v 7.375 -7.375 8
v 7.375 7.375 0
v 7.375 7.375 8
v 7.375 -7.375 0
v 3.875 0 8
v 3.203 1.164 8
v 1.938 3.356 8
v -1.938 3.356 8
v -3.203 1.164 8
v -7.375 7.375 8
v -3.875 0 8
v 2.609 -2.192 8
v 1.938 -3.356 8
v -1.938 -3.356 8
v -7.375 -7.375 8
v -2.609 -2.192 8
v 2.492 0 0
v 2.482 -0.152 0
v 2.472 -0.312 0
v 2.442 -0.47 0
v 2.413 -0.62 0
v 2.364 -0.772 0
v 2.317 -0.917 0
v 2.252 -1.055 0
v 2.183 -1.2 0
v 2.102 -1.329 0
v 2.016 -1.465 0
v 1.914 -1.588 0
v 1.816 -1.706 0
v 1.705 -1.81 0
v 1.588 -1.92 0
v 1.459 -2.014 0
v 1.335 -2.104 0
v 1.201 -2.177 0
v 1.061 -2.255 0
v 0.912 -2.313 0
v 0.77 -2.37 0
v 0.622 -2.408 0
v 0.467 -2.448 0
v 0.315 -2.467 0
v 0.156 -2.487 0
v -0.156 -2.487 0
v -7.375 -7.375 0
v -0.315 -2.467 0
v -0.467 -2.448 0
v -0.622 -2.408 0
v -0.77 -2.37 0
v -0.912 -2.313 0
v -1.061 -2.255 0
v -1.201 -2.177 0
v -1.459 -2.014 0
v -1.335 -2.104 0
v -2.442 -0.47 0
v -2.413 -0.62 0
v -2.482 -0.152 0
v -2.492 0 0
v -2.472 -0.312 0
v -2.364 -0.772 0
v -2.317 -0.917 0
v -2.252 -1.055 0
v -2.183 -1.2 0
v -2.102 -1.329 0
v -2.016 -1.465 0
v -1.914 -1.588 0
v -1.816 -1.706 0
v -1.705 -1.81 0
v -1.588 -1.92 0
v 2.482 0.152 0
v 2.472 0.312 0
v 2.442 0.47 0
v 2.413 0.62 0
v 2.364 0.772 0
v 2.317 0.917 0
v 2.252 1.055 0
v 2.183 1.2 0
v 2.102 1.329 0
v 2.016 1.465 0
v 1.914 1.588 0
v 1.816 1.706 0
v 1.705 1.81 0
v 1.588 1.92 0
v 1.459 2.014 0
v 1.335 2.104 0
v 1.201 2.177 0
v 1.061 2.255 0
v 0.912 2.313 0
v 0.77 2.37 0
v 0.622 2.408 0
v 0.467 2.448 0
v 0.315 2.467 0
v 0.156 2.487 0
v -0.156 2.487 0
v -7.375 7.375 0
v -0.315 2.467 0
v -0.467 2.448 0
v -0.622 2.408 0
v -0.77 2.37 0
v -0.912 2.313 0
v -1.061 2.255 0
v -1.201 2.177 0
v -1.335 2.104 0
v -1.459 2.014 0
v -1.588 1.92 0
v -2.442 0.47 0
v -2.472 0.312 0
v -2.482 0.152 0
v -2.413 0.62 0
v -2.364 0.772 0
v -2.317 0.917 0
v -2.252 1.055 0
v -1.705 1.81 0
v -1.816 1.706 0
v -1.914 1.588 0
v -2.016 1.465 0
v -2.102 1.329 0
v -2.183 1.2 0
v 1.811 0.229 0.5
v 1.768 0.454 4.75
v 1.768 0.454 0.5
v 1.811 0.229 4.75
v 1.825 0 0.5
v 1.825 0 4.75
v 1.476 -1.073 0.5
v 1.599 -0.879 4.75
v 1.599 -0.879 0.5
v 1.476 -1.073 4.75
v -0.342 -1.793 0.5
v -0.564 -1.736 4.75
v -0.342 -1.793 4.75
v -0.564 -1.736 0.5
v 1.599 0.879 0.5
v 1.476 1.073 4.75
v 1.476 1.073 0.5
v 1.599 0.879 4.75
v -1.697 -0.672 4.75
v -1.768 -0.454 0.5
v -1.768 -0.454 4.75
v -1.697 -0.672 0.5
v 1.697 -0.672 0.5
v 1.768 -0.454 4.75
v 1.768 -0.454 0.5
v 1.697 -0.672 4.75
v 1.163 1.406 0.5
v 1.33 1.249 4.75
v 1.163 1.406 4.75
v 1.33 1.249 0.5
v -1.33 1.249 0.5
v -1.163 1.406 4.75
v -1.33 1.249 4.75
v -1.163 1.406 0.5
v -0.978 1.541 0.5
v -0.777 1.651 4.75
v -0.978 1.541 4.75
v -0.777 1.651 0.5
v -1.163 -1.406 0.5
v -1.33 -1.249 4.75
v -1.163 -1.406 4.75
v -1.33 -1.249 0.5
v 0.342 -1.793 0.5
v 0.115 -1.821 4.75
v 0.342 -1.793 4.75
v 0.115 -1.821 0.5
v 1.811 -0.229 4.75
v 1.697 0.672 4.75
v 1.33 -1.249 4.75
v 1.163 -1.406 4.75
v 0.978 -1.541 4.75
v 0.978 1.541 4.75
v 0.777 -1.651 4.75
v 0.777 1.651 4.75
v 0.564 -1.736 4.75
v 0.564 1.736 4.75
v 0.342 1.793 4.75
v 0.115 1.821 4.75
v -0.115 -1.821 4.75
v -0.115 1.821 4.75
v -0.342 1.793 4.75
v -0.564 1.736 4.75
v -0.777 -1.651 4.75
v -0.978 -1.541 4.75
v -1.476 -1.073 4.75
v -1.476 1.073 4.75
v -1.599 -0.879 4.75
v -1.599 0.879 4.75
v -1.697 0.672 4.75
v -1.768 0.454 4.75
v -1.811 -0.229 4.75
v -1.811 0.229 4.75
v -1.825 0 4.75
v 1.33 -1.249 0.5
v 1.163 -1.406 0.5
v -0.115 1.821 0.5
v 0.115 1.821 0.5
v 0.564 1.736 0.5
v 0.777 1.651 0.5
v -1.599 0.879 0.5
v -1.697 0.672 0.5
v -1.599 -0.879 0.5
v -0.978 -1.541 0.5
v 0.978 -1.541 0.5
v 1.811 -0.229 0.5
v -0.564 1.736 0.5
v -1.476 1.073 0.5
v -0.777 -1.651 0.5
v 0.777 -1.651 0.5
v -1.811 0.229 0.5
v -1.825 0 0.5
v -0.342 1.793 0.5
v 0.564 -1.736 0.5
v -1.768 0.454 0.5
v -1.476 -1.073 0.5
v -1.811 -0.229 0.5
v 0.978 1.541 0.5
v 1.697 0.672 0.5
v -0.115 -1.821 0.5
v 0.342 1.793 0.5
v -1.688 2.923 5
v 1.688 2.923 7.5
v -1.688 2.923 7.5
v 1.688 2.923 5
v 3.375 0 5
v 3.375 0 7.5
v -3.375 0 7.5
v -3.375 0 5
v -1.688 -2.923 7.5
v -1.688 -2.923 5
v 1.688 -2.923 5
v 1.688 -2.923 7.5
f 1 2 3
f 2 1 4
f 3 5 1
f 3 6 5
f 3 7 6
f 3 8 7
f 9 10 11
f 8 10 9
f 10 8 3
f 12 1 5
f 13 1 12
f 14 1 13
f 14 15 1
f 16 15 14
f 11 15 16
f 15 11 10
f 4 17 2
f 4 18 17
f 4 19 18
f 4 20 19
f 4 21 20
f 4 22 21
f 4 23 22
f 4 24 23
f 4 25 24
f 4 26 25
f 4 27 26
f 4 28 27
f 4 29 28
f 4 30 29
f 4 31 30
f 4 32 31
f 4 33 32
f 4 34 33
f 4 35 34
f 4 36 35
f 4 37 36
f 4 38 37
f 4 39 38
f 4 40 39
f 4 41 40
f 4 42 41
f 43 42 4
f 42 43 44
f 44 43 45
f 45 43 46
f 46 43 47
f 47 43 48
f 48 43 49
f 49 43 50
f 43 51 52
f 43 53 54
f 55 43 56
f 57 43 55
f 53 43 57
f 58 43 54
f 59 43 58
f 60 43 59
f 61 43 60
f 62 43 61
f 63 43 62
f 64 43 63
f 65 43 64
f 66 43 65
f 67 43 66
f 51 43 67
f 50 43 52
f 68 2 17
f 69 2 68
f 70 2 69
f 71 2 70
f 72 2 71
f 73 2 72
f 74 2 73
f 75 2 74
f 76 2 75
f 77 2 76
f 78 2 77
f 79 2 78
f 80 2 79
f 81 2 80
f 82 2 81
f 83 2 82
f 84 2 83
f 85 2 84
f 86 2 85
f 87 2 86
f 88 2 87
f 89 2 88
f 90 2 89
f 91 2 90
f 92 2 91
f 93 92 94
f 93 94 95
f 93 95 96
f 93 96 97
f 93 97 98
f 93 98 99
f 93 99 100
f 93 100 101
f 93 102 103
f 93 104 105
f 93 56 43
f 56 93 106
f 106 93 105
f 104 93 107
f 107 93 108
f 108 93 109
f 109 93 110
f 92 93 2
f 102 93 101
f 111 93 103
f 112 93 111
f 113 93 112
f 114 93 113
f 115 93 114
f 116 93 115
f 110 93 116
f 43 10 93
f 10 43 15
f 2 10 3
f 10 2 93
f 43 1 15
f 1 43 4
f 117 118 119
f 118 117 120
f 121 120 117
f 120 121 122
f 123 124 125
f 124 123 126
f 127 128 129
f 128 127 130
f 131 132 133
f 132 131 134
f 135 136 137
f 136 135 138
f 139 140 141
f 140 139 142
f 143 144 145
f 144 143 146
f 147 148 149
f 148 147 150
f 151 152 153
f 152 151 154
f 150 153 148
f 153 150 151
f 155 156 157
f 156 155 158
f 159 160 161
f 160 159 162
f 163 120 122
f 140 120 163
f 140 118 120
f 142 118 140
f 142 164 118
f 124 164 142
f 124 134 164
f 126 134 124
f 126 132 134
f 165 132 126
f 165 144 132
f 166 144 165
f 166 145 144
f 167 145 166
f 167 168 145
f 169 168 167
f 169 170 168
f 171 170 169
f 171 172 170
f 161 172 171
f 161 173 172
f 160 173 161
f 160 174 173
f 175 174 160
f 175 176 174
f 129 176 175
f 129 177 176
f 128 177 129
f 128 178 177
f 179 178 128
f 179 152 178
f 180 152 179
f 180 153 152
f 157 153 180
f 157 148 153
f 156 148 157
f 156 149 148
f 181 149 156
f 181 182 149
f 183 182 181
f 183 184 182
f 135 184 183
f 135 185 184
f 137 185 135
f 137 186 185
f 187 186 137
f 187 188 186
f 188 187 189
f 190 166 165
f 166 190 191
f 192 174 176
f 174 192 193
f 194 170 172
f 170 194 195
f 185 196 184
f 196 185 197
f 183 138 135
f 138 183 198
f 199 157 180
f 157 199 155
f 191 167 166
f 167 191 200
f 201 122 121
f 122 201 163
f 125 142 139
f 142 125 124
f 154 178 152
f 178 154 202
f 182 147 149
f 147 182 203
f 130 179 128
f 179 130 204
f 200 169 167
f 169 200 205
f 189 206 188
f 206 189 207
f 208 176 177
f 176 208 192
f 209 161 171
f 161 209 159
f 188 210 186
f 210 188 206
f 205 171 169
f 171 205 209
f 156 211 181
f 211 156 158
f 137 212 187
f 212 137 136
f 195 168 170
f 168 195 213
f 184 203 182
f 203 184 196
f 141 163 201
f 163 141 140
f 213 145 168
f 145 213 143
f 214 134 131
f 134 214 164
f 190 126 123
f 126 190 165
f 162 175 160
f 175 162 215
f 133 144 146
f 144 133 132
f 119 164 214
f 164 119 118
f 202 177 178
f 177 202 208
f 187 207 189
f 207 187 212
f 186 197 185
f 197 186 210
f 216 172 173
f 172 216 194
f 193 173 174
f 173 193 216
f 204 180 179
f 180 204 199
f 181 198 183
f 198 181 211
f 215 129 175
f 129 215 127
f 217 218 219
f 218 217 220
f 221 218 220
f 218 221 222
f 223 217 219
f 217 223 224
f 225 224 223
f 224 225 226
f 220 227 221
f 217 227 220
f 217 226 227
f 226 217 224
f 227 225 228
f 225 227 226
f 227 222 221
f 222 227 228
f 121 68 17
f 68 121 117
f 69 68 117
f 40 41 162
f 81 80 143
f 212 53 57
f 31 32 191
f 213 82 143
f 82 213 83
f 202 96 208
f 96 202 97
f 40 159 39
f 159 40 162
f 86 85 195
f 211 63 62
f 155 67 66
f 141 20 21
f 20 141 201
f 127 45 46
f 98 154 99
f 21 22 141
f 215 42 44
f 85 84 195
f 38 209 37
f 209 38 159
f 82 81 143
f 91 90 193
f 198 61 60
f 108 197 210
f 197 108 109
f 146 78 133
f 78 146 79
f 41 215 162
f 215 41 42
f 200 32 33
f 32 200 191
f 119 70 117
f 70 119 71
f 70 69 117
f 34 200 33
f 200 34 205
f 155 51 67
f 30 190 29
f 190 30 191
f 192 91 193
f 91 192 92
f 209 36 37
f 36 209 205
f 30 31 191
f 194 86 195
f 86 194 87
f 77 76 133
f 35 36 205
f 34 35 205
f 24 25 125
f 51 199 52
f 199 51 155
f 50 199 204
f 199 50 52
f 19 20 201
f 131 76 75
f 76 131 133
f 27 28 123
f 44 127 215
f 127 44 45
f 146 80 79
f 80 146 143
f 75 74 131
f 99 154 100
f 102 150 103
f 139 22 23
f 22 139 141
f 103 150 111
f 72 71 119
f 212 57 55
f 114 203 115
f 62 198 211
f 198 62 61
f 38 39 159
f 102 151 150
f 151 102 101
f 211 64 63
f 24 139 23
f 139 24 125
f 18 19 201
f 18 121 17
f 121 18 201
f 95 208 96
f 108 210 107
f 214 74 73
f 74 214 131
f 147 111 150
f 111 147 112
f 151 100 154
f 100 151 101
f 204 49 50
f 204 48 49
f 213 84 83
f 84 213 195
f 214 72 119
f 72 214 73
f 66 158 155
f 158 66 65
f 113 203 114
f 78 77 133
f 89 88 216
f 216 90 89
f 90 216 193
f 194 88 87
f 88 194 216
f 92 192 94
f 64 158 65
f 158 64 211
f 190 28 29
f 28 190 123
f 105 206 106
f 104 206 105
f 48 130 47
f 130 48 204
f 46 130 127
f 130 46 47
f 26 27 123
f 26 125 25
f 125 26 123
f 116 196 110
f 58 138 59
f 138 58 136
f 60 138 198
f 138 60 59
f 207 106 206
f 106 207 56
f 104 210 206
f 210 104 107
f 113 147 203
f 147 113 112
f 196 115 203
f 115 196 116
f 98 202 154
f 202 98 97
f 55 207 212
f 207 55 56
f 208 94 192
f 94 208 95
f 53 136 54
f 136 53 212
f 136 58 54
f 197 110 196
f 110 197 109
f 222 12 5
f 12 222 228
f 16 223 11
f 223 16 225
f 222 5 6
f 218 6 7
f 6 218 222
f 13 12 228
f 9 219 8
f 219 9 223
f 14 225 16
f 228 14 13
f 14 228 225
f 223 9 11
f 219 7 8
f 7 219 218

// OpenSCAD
// File: 3d_print_screw_hole_test.scad
// Author: Mark Heywood alias Airtripper
// Airtripper Extruder Filament Force Sensor Bracket
// by Airtripper May 2013
// Copyright © 2013 Airtripper
// http://www.airtripper.com
// Licensed Attribution-NonCommercial-ShareAlike 3.0 Unported. 
// Last edit: 26/09/2013




/* [Global] */

//  - Select part to view/print from list
view_part = 1;	// [0:design, 1:head_up, 2:head_down, 3:horizontal]


//  - Screw head diameter - flat side to flat side on hex nut or bolt head
head = 6.75;		
//  - Screw head type - [6] for hex head and [50] or more for round head
type = 6;			
//  - Screw size diameter
size = 3.65;		
//  - Screw size diameter smoothness
smoothness = 50;	
//  - Screw size length - not including screw head
length = 5;			
//  - Screw head length
cap = 3;			
//  - Block border thickness between screw head and block edge
border = 4;			
//  - Print layer thickness - only required for head down print
layer = 0.25;			



/* hidden */

//++++++++++++++++++++ Model View, Positioning and Rotation ++++++++++++++++++++


if (view_part == 0) {	// Original design view & position
	translate([0,0,0]) rotate([0,0,0]) screw_block();
}
if (view_part == 1) {	// Centred head up position
	translate([-((border*2)+head)/2,-((border*2)+head)/2,0]) rotate([0,0,0]) screw_block();
}
if (view_part == 2) {	// Centred head down position
	translate([((border*2)+head)/2,-((border*2)+head)/2,length+cap]) rotate([0,-180,0]) screw_block();
}
if (view_part == 3) {	// Centred horizontal position
	translate([-((border*2)+head)/2,(length+cap)/2,0]) rotate([90,0,0]) screw_block();
}


//++++++++++++++++++++ Script Subroutines ++++++++++++++++++++


//######################### Screw Block ##########################

// screw_block();

module screw_block() {
	difference() {
		translate([0,0,0]) cube([head+(border*2),head+(border*2),length+cap]);	// block
		translate([border+(head/2),border+(head/2),-1-layer]) cylinder(length+1, r=size/2, $fn=smoothness);	// screw size
		translate([border+(head/2),border+(head/2),length]) cylinder(cap+1, r=head/2, $fn=type);	// screw head/cap
		translate([border+(head/2),border+(head/2),-1]) color("red") cylinder(1.5, r1=(size/2)+2, r2=size/2, $fn=smoothness);	// screw size taper
		translate([border+(head/2),border+(head/2),length+cap-0.5]) color("red") cylinder(2, r1=head/2, r2=(head/2)+2, $fn=type);	// screw head/cap taper
	}

}














// end
